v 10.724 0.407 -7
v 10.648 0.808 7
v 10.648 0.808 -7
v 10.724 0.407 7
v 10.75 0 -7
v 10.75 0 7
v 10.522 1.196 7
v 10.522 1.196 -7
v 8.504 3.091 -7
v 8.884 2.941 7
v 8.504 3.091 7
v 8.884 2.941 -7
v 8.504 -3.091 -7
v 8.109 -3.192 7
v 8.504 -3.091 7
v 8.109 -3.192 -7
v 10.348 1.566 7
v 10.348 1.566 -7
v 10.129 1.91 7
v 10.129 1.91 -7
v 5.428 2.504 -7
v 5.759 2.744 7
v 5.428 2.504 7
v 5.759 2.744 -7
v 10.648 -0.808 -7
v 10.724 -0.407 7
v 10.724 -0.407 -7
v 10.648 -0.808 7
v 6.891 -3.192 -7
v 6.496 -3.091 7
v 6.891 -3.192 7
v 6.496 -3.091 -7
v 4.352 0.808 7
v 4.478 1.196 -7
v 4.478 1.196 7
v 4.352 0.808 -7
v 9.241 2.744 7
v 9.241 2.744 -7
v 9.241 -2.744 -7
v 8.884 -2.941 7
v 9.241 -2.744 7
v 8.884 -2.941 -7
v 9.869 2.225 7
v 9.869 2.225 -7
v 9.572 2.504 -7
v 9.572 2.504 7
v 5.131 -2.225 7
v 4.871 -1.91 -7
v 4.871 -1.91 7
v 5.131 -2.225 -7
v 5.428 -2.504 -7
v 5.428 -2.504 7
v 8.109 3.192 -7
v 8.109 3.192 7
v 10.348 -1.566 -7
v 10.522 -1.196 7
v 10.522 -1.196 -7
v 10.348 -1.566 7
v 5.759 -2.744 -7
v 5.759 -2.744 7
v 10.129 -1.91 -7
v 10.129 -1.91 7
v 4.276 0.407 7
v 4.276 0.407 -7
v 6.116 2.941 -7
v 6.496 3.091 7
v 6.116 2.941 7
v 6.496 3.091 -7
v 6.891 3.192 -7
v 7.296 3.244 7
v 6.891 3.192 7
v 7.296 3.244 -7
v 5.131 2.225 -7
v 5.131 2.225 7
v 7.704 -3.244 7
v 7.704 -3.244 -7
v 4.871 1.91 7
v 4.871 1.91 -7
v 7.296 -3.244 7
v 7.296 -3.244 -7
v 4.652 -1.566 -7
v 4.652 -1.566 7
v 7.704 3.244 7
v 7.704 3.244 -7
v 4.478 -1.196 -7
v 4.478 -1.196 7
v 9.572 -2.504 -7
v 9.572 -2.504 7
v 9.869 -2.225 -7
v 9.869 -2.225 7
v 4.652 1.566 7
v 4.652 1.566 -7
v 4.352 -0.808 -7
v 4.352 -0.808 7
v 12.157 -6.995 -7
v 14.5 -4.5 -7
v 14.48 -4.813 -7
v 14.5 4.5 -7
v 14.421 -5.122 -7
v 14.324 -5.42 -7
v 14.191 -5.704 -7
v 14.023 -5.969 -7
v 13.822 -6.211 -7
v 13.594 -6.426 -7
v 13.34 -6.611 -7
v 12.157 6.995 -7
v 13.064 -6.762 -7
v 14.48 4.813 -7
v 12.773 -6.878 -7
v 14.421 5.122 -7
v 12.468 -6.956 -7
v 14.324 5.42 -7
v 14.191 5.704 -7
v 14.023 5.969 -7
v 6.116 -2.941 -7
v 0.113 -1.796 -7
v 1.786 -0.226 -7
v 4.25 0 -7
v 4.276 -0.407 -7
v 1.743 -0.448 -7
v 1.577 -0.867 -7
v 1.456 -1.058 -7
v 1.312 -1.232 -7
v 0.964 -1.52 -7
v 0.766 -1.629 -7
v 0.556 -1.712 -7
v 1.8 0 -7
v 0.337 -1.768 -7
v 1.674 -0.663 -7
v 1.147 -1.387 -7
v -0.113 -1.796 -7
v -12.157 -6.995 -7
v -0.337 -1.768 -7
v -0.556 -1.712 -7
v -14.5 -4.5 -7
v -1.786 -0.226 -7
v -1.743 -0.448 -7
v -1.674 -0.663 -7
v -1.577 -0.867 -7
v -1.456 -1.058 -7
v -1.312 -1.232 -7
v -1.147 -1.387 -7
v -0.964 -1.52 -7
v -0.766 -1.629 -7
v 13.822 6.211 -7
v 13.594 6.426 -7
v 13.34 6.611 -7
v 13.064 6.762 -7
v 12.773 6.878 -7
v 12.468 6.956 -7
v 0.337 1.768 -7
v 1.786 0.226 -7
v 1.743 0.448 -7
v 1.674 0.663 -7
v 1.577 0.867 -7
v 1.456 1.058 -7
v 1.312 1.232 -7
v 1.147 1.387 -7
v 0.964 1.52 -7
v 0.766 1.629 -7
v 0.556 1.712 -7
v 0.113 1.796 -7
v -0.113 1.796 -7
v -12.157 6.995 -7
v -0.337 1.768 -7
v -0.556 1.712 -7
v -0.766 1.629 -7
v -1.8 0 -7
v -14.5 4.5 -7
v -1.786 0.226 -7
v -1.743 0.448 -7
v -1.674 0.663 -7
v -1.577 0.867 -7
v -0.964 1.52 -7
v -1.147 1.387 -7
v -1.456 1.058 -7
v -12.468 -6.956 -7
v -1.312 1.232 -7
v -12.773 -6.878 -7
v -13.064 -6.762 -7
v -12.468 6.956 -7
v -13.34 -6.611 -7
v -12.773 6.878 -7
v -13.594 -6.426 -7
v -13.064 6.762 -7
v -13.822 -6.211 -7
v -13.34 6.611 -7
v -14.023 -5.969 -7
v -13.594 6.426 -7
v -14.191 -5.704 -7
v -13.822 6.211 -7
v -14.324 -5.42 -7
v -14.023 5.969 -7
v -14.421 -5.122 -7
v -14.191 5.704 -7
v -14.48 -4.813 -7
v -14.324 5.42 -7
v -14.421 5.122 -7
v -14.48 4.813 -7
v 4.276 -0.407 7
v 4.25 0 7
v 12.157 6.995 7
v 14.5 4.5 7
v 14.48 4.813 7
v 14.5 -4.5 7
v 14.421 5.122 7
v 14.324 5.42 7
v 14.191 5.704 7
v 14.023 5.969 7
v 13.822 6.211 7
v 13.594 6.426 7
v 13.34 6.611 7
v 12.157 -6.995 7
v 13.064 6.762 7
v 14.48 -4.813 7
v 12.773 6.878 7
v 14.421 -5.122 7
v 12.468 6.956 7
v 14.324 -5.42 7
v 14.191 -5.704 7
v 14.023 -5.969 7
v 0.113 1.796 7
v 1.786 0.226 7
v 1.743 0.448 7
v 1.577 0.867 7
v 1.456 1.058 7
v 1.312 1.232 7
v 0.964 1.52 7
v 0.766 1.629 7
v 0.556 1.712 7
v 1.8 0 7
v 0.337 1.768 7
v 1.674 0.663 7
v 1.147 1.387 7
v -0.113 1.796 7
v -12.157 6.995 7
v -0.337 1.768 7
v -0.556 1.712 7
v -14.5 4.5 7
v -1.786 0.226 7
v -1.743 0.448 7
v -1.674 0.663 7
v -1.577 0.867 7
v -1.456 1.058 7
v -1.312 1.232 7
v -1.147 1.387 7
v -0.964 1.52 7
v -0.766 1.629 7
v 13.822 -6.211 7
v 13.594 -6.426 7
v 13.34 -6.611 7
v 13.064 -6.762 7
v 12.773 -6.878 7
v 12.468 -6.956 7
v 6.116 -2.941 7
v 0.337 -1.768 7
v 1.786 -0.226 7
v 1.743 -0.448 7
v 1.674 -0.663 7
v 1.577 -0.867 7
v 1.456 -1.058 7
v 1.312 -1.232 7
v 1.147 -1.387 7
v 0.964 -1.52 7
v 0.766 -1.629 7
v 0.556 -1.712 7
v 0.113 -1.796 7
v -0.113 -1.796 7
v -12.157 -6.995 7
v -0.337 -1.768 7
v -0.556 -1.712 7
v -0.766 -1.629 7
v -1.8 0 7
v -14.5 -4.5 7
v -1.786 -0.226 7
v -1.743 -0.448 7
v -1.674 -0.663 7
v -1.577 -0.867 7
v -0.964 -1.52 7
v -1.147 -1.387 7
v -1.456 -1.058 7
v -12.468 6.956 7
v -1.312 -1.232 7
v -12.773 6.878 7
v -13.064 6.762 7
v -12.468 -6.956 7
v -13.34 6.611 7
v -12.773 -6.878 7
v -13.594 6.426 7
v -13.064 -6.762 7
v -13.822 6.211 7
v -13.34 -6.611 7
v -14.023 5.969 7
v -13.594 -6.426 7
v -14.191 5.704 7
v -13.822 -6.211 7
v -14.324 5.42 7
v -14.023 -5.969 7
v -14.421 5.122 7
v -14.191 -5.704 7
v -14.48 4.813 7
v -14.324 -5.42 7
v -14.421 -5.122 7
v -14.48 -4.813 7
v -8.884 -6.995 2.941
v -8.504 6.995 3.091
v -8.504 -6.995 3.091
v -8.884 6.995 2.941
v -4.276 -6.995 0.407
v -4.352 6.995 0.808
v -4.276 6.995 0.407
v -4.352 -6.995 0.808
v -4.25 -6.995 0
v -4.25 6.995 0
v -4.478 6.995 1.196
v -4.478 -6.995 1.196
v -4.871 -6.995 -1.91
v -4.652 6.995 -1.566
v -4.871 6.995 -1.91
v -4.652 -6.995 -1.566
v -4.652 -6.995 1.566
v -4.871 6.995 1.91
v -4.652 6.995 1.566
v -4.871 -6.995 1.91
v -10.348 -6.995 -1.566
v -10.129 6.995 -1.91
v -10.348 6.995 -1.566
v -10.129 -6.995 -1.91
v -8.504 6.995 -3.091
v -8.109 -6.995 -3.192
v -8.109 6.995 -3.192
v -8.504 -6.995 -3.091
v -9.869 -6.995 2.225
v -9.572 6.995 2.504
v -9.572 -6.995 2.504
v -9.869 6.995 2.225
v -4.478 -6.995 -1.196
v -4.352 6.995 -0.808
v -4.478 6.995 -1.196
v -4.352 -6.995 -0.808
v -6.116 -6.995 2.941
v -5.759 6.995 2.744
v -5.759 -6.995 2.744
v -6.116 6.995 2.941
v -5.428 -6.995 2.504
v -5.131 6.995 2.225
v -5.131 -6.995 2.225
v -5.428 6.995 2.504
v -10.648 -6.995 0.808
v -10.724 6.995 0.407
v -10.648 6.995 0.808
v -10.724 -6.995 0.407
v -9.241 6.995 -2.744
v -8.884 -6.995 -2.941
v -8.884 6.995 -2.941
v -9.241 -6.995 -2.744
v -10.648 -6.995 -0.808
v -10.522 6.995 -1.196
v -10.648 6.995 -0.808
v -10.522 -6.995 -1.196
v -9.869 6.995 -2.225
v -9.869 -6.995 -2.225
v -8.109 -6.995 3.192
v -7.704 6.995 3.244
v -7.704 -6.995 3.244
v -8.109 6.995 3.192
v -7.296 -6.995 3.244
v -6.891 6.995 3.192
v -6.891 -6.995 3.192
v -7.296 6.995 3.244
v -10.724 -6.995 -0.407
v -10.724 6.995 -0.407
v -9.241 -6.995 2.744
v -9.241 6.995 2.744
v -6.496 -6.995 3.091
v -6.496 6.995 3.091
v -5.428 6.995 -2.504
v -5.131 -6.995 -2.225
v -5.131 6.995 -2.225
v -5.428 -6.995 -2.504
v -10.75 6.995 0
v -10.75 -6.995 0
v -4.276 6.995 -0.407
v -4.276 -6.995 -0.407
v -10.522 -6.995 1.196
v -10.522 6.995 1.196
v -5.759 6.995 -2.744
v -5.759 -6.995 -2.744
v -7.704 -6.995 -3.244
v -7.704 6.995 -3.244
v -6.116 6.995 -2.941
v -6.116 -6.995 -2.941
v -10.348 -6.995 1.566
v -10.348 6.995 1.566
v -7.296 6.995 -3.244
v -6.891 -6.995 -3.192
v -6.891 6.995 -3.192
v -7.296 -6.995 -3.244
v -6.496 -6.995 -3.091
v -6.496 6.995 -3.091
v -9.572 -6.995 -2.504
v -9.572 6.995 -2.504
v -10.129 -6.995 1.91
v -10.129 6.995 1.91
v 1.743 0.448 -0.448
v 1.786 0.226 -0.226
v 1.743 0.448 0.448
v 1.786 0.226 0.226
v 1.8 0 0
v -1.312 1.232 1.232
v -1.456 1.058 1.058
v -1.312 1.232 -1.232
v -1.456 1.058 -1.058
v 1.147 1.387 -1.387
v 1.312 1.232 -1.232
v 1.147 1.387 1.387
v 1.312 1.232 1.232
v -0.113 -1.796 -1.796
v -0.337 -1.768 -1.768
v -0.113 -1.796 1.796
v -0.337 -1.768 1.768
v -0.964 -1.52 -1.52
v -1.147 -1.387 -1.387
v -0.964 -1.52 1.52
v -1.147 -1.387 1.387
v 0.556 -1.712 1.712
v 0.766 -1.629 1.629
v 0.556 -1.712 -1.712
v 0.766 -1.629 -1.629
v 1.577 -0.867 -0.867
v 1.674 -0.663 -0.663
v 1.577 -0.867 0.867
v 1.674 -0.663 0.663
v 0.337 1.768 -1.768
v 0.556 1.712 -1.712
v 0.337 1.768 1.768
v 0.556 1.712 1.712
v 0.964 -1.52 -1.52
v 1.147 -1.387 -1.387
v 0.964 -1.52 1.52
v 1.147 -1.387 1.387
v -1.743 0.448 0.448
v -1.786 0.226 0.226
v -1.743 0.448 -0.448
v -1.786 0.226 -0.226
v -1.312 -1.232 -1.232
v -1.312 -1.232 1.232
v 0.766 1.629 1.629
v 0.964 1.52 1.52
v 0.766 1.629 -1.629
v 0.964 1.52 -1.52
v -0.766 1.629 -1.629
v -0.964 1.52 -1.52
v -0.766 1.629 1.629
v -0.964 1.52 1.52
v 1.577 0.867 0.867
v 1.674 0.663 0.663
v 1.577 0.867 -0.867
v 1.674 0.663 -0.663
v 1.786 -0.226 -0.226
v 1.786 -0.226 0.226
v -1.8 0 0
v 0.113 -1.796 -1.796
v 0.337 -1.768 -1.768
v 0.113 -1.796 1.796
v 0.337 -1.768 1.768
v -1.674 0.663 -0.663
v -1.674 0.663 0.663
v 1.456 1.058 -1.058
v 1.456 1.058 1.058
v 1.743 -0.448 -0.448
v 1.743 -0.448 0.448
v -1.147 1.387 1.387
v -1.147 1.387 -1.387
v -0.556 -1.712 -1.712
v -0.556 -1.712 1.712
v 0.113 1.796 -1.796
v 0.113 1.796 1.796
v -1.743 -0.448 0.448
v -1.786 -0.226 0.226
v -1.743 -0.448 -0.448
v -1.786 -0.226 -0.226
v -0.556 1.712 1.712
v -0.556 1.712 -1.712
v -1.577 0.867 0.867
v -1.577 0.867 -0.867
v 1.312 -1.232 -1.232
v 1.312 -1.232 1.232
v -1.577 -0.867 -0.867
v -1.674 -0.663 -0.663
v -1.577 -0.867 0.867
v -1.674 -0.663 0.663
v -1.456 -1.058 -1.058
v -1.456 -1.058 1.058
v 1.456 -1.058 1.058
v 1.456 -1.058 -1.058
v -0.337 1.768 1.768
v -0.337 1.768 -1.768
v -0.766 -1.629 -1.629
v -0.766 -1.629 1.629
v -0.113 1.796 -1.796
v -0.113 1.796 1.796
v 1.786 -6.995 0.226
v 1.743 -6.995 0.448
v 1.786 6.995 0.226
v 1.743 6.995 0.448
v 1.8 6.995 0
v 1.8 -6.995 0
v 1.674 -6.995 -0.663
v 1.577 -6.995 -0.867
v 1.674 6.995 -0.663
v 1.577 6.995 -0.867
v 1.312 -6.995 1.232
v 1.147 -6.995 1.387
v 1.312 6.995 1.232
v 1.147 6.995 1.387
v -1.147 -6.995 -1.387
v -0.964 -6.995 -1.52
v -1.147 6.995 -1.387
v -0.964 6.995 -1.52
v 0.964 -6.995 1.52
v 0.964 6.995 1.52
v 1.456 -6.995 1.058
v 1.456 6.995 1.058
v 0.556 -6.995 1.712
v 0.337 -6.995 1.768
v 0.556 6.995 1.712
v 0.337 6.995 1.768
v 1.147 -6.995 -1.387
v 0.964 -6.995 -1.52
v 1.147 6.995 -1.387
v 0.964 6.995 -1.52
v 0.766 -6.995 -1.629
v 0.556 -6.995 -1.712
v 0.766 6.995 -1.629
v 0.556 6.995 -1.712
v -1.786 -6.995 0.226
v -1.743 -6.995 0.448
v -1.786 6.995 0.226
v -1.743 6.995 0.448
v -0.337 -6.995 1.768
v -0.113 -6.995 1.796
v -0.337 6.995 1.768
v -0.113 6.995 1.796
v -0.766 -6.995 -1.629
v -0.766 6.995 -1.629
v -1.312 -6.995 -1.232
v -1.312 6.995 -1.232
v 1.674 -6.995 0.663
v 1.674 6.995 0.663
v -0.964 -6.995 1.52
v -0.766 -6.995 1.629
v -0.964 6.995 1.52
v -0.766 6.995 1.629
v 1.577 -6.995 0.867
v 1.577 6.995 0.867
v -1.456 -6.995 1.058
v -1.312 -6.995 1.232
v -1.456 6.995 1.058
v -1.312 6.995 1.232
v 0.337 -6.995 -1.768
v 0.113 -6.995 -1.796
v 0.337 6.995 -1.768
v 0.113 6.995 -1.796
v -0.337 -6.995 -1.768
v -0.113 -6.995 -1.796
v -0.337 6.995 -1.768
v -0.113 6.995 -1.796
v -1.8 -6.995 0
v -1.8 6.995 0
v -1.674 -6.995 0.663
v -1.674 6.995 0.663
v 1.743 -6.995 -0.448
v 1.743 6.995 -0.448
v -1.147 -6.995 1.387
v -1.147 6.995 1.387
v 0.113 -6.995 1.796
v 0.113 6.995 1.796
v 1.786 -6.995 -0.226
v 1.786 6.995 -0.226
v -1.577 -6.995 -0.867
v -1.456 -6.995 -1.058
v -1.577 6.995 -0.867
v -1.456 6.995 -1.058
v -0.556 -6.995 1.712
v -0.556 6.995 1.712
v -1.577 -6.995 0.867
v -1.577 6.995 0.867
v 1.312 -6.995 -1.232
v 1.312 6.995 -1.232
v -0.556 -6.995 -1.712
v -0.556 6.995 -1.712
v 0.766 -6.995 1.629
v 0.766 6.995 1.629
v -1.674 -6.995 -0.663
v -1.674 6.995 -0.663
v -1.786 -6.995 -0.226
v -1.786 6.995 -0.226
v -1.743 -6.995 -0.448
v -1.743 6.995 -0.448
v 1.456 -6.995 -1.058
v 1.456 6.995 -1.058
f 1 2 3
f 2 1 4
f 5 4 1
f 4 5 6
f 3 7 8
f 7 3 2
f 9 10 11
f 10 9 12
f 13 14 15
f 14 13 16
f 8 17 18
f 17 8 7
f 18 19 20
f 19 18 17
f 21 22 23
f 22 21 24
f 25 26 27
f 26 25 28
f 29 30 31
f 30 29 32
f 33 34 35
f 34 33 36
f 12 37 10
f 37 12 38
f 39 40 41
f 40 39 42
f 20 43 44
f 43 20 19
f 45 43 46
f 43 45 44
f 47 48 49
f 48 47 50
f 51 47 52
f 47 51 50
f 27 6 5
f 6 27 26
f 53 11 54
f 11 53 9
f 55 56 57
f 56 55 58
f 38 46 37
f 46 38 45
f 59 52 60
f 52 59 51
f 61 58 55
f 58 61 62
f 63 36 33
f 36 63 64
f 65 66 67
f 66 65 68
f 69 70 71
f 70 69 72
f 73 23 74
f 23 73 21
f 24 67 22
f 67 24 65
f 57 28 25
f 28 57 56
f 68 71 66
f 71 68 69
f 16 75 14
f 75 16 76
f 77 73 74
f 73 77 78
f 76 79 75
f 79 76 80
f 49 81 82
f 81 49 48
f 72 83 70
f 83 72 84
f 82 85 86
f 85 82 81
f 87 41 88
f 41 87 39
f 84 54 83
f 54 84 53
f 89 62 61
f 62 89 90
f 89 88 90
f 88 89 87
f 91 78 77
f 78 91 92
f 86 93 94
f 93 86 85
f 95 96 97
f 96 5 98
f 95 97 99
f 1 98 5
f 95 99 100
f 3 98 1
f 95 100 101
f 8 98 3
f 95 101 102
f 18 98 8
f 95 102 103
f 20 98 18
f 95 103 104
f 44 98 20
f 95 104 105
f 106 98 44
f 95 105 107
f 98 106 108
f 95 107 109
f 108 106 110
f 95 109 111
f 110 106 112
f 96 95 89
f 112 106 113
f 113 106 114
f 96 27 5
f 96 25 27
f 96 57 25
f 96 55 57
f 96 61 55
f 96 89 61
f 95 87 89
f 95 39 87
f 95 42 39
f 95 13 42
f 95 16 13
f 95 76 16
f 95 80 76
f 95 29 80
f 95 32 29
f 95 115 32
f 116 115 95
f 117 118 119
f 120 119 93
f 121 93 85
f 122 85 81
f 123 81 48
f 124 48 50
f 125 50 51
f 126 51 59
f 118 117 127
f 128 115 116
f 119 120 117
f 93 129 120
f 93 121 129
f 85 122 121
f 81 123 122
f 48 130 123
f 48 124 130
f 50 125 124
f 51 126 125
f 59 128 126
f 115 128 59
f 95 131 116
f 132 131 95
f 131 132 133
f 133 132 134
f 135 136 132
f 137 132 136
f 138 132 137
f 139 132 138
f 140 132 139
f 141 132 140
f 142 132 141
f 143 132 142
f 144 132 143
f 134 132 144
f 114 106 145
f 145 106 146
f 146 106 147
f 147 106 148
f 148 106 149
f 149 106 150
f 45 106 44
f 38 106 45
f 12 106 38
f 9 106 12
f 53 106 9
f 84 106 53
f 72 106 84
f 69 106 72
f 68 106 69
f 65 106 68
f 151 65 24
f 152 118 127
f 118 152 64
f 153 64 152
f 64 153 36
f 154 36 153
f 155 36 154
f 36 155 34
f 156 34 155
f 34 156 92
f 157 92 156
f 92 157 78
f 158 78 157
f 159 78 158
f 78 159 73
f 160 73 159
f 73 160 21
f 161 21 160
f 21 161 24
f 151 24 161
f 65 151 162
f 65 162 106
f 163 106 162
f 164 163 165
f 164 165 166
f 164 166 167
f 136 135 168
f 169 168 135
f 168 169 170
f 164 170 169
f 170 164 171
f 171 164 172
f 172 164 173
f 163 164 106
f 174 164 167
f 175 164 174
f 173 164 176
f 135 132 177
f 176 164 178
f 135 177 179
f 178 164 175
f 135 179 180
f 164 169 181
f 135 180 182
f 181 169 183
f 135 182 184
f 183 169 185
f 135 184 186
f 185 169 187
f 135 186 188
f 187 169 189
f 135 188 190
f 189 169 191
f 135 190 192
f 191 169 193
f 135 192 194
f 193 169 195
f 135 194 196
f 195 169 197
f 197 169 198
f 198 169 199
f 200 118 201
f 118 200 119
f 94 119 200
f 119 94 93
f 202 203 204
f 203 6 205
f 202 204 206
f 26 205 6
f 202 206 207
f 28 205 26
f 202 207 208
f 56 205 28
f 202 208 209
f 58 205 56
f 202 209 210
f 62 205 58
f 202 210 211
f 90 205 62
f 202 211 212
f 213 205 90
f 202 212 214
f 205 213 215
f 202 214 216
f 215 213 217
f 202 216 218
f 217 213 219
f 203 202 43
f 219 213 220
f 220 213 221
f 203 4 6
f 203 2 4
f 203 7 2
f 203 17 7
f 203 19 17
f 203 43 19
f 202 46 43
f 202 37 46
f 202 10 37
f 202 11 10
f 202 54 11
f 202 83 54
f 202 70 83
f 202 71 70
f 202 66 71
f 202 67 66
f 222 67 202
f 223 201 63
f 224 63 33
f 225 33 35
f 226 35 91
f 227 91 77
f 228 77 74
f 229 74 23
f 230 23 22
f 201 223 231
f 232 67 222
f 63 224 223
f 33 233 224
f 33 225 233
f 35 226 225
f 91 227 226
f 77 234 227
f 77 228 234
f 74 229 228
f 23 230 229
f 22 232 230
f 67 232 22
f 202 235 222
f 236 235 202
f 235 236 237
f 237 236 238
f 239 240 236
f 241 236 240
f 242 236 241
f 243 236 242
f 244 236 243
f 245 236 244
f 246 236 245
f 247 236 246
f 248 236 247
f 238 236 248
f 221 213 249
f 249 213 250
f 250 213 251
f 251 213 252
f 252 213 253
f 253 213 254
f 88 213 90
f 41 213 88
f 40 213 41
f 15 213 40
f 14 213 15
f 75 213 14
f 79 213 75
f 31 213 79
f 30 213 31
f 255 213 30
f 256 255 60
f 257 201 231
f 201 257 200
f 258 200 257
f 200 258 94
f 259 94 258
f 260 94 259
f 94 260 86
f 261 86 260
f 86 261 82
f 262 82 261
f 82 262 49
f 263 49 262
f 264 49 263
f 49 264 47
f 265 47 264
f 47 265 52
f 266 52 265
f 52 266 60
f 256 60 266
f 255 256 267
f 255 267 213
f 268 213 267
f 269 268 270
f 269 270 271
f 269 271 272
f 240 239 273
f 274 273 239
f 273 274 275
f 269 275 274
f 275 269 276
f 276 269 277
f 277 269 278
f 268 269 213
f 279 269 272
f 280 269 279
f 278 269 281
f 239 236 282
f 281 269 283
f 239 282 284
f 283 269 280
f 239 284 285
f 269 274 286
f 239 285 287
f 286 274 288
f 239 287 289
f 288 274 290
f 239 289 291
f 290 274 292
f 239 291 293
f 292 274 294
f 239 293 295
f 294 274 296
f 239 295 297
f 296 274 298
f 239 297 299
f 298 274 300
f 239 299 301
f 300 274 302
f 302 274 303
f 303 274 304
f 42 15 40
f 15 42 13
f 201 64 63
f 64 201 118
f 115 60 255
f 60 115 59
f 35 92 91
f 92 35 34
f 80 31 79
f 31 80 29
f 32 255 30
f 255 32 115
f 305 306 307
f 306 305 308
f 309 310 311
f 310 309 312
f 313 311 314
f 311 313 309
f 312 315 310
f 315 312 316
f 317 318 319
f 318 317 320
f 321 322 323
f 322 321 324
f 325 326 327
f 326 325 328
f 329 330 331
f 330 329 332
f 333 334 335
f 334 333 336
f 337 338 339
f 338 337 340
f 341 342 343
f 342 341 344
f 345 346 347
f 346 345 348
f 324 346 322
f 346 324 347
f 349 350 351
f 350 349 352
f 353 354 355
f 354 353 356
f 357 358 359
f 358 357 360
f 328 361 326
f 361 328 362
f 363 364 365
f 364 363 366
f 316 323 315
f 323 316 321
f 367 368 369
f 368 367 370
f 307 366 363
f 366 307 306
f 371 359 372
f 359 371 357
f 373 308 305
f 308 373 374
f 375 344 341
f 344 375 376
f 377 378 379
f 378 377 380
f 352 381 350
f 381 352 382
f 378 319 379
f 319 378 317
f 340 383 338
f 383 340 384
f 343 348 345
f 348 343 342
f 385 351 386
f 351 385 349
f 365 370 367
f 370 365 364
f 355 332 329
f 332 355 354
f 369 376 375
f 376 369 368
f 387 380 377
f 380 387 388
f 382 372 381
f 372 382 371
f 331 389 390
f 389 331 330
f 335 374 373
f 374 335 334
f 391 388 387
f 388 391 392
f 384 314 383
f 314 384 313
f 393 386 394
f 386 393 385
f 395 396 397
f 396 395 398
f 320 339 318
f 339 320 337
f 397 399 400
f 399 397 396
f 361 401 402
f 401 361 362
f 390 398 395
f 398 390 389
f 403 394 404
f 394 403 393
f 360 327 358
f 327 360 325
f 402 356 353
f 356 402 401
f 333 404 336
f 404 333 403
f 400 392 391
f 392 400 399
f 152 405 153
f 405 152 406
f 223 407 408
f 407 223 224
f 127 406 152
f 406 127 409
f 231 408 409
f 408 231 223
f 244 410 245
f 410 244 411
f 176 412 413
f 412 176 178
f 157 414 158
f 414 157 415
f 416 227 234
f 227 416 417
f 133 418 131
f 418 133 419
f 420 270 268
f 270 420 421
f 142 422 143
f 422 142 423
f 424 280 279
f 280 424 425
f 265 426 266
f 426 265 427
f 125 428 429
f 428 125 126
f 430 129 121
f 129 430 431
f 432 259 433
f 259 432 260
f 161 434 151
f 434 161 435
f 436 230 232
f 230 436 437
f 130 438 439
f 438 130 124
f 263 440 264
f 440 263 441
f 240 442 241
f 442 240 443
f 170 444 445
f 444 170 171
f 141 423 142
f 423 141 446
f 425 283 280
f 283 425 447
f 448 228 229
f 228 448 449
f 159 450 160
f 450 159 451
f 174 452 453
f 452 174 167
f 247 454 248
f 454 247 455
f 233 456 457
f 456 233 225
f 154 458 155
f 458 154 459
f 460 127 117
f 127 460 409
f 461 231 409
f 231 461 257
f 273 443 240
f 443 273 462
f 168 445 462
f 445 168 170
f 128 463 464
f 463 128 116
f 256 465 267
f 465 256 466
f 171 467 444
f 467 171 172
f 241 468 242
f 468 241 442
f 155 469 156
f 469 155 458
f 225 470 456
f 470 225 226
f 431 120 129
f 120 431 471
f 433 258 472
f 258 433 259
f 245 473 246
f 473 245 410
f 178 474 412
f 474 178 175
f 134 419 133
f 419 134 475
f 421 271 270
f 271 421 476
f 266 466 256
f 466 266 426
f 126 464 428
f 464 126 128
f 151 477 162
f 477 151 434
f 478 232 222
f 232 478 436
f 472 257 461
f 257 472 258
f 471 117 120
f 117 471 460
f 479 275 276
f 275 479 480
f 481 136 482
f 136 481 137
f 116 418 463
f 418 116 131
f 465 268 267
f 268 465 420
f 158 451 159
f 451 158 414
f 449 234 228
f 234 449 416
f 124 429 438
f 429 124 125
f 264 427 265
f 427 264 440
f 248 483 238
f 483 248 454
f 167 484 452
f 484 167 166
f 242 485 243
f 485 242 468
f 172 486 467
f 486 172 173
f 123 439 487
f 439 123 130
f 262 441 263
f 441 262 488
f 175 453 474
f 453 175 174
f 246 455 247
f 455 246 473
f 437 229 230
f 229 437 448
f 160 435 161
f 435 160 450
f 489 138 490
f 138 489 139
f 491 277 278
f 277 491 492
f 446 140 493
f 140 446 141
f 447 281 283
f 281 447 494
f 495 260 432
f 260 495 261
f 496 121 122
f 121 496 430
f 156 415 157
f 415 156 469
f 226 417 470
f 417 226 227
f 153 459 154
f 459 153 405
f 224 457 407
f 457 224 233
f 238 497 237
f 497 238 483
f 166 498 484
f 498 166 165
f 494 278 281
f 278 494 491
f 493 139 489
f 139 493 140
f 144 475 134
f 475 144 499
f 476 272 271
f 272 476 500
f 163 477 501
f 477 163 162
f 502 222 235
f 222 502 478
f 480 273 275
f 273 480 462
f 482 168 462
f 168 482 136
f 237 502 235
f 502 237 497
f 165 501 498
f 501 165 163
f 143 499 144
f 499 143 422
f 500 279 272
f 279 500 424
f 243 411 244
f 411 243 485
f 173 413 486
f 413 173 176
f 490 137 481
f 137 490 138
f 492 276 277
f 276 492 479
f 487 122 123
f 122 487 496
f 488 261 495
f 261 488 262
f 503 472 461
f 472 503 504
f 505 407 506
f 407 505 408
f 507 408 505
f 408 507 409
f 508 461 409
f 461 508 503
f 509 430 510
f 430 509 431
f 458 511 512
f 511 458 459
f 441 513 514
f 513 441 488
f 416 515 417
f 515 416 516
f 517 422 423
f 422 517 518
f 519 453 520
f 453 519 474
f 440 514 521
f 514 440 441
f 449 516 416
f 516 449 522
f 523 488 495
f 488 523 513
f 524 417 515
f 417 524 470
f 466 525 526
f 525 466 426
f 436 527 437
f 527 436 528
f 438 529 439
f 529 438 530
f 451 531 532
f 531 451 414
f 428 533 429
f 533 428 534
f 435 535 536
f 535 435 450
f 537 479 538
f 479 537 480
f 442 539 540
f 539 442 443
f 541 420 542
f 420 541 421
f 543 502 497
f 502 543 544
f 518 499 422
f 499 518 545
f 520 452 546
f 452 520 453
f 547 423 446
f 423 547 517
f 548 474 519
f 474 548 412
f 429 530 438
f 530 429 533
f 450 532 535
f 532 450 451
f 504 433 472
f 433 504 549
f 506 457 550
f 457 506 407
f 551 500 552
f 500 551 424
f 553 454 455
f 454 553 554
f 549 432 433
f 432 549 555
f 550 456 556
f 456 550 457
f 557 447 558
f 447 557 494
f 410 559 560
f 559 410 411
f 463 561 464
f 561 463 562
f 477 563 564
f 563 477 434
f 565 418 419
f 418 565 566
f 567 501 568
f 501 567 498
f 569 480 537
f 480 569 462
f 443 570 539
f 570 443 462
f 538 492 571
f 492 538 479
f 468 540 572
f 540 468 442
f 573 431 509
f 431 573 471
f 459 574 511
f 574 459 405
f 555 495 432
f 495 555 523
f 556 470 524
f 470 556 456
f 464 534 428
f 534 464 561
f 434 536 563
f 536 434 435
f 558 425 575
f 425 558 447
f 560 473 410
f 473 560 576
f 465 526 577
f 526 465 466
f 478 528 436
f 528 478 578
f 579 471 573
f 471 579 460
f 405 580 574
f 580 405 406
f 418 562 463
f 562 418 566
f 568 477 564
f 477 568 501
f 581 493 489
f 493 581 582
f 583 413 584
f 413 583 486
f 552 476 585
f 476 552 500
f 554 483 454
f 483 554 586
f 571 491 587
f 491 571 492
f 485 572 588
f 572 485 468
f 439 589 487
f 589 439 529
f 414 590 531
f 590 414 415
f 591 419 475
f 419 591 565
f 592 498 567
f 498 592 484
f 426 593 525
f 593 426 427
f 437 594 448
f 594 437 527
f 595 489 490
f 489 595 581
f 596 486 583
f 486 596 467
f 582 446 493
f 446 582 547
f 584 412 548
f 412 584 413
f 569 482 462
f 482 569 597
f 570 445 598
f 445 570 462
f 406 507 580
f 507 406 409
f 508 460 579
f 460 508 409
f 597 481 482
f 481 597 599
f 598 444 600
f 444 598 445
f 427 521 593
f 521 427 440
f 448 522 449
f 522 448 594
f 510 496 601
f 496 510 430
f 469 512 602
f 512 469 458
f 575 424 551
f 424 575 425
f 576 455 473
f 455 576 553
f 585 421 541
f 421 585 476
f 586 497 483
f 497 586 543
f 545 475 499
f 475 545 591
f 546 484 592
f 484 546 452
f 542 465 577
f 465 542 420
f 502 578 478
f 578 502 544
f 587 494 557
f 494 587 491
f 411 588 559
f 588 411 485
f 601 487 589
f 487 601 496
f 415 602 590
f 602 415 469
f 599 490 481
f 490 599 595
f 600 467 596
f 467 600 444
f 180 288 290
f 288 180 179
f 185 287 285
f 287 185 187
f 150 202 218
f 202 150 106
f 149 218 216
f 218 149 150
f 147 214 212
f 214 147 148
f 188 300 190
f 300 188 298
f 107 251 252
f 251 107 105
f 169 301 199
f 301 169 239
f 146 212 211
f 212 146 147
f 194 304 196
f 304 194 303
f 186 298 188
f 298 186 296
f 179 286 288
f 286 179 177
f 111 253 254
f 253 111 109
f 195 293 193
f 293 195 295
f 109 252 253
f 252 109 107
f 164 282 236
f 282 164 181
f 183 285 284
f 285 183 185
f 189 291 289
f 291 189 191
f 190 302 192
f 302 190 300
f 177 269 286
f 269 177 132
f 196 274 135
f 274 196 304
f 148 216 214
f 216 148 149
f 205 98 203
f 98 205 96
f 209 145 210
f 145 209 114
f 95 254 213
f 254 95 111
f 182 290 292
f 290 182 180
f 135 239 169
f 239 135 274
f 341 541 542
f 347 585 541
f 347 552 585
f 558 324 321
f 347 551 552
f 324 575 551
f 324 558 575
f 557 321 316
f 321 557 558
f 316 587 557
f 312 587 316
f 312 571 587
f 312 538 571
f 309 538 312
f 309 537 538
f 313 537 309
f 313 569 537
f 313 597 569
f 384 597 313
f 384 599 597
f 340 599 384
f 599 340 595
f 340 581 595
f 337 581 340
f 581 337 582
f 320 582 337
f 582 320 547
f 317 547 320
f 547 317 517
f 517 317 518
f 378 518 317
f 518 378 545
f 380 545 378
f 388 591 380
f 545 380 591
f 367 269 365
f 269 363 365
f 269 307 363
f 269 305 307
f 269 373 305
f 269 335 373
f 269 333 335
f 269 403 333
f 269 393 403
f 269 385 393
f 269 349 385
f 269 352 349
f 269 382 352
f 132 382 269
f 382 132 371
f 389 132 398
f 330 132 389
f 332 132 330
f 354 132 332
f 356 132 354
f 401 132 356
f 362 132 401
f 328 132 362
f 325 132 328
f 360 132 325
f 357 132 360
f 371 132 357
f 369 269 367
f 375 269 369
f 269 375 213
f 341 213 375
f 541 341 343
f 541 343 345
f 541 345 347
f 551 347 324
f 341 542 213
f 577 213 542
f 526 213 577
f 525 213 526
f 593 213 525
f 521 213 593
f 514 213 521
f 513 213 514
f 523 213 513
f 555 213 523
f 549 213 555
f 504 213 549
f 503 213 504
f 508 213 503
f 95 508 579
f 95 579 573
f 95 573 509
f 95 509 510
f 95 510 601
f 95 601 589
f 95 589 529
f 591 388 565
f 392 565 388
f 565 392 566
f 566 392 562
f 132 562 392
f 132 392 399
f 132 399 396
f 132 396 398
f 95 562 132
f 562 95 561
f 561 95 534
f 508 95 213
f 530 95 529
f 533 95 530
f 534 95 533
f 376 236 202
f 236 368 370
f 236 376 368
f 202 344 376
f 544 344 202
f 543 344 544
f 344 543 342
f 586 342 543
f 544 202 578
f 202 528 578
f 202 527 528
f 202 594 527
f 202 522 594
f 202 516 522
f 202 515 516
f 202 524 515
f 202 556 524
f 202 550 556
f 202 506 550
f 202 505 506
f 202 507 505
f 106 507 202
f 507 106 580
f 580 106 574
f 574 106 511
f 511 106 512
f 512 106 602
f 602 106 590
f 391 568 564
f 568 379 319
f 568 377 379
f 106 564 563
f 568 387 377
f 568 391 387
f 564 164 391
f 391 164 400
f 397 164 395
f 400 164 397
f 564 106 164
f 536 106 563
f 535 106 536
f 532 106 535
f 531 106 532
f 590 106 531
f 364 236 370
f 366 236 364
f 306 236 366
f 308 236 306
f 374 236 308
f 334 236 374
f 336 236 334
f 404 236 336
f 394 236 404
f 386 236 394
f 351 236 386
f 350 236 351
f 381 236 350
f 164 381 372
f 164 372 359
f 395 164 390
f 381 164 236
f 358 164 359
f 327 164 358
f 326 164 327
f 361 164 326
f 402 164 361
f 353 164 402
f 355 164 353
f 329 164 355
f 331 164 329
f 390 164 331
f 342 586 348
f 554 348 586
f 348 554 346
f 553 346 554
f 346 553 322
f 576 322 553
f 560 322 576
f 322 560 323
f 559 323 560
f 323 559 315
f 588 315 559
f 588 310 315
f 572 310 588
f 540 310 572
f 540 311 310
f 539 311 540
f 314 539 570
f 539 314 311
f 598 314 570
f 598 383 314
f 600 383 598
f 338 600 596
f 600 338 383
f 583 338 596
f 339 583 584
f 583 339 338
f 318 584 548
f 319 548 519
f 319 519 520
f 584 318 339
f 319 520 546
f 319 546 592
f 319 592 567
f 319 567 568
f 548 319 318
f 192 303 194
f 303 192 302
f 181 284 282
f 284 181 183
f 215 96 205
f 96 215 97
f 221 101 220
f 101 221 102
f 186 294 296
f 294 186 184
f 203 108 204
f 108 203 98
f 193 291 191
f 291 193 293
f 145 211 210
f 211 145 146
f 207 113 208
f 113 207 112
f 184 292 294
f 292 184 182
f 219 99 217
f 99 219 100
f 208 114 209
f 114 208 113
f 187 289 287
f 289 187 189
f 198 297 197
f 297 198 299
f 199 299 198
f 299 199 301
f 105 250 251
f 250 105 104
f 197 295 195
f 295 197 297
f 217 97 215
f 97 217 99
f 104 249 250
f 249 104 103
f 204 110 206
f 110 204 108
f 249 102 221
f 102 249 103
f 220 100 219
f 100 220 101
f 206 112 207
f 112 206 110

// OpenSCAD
$fn = 50;


difference() {
	union() {
		*color(alpha = 1.0000000000, c = "gray") {
			translate(v = [0, 7, 0]) {
				linear_extrude(height = 1) {
					text(font = "Arial:style=Bold", halign = "center", size = 4.5000000000, text = "COMMENT plate main", valign = "center");
				}
			}
		}
		*color(alpha = 1.0000000000, c = "gray") {
			translate(v = [0, 14, -7.0000000000]) {
				linear_extrude(height = 1) {
					text(font = "Arial:style=Bold", halign = "center", size = 4.5000000000, text = "COMMENT description oobb_plate_shape_p_type_14_depth_0_0_-7.0_pos_2_width_1_height_14_thickness_ninety_degree_extra_2.5_r", valign = "center");
				}
			}
		}
		translate(v = [0, 0, -7.0000000000]) {
			hull() {
				translate(v = [-12.0000000000, 4.5000000000, 0]) {
					cylinder(h = 14, r = 2.5000000000);
				}
				translate(v = [12.0000000000, 4.5000000000, 0]) {
					cylinder(h = 14, r = 2.5000000000);
				}
				translate(v = [-12.0000000000, -4.5000000000, 0]) {
					cylinder(h = 14, r = 2.5000000000);
				}
				translate(v = [12.0000000000, -4.5000000000, 0]) {
					cylinder(h = 14, r = 2.5000000000);
				}
			}
		}
	}
	union() {
		*color(alpha = 1.0000000000, c = "gray") {
			translate(v = [7.5000000000, 14, -7.0000000000]) {
				linear_extrude(height = 1) {
					text(font = "Arial:style=Bold", halign = "center", size = 4.5000000000, text = "COMMENT description oobb_hole_shape_n_type_m6_radius_name_14_depth_7.5_0_-7.0_pos_2_width_1_height_14_thickness_ninety_degree_extra_true_both_holes_single_holes_0_0_0_rot", valign = "center");
				}
			}
		}
		translate(v = [7.5000000000, 0, -7.0000000000]) {
			cylinder(h = 14, r = 3.2500000000);
		}
		*color(alpha = 1.0000000000, c = "gray") {
			translate(v = [-7.5000000000, 21.0000000000, 0]) {
				rotate(a = [90, 0, 0]) {
					linear_extrude(height = 1) {
						text(font = "Arial:style=Bold", halign = "center", size = 4.5000000000, text = "COMMENT description oobb_hole_shape_n_type_m6_radius_name_14_depth_-7.5_7.0_0_pos_2_width_1_height_14_thickness_ninety_degree_extra_true_both_holes_single_holes_90_0_0_rot", valign = "center");
					}
				}
			}
		}
		translate(v = [-7.5000000000, 7.0000000000, 0]) {
			rotate(a = [90, 0, 0]) {
				cylinder(h = 14, r = 3.2500000000);
			}
		}
		*color(alpha = 1.0000000000, c = "gray") {
			translate(v = [0.0000000000, 14, -7.0000000000]) {
				linear_extrude(height = 1) {
					text(font = "Arial:style=Bold", halign = "center", size = 4.5000000000, text = "COMMENT description oobb_hole_shape_n_type_m3_radius_name_14_depth_0.0_0_-7.0_pos_2_width_1_height_14_thickness_ninety_degree_extra_true_both_holes_single_holes_0_0_0_rot", valign = "center");
				}
			}
		}
		translate(v = [0.0000000000, 0, -7.0000000000]) {
			cylinder(h = 14, r = 1.8000000000);
		}
		*color(alpha = 1.0000000000, c = "gray") {
			translate(v = [0.0000000000, 21.0000000000, 0]) {
				rotate(a = [90, 0, 0]) {
					linear_extrude(height = 1) {
						text(font = "Arial:style=Bold", halign = "center", size = 4.5000000000, text = "COMMENT description oobb_hole_shape_n_type_m3_radius_name_14_depth_0.0_7.0_0_pos_2_width_1_height_14_thickness_ninety_degree_extra_true_both_holes_single_holes_90_0_0_rot", valign = "center");
					}
				}
			}
		}
		translate(v = [0.0000000000, 7.0000000000, 0]) {
			rotate(a = [90, 0, 0]) {
				cylinder(h = 14, r = 1.8000000000);
			}
		}
	}
}
